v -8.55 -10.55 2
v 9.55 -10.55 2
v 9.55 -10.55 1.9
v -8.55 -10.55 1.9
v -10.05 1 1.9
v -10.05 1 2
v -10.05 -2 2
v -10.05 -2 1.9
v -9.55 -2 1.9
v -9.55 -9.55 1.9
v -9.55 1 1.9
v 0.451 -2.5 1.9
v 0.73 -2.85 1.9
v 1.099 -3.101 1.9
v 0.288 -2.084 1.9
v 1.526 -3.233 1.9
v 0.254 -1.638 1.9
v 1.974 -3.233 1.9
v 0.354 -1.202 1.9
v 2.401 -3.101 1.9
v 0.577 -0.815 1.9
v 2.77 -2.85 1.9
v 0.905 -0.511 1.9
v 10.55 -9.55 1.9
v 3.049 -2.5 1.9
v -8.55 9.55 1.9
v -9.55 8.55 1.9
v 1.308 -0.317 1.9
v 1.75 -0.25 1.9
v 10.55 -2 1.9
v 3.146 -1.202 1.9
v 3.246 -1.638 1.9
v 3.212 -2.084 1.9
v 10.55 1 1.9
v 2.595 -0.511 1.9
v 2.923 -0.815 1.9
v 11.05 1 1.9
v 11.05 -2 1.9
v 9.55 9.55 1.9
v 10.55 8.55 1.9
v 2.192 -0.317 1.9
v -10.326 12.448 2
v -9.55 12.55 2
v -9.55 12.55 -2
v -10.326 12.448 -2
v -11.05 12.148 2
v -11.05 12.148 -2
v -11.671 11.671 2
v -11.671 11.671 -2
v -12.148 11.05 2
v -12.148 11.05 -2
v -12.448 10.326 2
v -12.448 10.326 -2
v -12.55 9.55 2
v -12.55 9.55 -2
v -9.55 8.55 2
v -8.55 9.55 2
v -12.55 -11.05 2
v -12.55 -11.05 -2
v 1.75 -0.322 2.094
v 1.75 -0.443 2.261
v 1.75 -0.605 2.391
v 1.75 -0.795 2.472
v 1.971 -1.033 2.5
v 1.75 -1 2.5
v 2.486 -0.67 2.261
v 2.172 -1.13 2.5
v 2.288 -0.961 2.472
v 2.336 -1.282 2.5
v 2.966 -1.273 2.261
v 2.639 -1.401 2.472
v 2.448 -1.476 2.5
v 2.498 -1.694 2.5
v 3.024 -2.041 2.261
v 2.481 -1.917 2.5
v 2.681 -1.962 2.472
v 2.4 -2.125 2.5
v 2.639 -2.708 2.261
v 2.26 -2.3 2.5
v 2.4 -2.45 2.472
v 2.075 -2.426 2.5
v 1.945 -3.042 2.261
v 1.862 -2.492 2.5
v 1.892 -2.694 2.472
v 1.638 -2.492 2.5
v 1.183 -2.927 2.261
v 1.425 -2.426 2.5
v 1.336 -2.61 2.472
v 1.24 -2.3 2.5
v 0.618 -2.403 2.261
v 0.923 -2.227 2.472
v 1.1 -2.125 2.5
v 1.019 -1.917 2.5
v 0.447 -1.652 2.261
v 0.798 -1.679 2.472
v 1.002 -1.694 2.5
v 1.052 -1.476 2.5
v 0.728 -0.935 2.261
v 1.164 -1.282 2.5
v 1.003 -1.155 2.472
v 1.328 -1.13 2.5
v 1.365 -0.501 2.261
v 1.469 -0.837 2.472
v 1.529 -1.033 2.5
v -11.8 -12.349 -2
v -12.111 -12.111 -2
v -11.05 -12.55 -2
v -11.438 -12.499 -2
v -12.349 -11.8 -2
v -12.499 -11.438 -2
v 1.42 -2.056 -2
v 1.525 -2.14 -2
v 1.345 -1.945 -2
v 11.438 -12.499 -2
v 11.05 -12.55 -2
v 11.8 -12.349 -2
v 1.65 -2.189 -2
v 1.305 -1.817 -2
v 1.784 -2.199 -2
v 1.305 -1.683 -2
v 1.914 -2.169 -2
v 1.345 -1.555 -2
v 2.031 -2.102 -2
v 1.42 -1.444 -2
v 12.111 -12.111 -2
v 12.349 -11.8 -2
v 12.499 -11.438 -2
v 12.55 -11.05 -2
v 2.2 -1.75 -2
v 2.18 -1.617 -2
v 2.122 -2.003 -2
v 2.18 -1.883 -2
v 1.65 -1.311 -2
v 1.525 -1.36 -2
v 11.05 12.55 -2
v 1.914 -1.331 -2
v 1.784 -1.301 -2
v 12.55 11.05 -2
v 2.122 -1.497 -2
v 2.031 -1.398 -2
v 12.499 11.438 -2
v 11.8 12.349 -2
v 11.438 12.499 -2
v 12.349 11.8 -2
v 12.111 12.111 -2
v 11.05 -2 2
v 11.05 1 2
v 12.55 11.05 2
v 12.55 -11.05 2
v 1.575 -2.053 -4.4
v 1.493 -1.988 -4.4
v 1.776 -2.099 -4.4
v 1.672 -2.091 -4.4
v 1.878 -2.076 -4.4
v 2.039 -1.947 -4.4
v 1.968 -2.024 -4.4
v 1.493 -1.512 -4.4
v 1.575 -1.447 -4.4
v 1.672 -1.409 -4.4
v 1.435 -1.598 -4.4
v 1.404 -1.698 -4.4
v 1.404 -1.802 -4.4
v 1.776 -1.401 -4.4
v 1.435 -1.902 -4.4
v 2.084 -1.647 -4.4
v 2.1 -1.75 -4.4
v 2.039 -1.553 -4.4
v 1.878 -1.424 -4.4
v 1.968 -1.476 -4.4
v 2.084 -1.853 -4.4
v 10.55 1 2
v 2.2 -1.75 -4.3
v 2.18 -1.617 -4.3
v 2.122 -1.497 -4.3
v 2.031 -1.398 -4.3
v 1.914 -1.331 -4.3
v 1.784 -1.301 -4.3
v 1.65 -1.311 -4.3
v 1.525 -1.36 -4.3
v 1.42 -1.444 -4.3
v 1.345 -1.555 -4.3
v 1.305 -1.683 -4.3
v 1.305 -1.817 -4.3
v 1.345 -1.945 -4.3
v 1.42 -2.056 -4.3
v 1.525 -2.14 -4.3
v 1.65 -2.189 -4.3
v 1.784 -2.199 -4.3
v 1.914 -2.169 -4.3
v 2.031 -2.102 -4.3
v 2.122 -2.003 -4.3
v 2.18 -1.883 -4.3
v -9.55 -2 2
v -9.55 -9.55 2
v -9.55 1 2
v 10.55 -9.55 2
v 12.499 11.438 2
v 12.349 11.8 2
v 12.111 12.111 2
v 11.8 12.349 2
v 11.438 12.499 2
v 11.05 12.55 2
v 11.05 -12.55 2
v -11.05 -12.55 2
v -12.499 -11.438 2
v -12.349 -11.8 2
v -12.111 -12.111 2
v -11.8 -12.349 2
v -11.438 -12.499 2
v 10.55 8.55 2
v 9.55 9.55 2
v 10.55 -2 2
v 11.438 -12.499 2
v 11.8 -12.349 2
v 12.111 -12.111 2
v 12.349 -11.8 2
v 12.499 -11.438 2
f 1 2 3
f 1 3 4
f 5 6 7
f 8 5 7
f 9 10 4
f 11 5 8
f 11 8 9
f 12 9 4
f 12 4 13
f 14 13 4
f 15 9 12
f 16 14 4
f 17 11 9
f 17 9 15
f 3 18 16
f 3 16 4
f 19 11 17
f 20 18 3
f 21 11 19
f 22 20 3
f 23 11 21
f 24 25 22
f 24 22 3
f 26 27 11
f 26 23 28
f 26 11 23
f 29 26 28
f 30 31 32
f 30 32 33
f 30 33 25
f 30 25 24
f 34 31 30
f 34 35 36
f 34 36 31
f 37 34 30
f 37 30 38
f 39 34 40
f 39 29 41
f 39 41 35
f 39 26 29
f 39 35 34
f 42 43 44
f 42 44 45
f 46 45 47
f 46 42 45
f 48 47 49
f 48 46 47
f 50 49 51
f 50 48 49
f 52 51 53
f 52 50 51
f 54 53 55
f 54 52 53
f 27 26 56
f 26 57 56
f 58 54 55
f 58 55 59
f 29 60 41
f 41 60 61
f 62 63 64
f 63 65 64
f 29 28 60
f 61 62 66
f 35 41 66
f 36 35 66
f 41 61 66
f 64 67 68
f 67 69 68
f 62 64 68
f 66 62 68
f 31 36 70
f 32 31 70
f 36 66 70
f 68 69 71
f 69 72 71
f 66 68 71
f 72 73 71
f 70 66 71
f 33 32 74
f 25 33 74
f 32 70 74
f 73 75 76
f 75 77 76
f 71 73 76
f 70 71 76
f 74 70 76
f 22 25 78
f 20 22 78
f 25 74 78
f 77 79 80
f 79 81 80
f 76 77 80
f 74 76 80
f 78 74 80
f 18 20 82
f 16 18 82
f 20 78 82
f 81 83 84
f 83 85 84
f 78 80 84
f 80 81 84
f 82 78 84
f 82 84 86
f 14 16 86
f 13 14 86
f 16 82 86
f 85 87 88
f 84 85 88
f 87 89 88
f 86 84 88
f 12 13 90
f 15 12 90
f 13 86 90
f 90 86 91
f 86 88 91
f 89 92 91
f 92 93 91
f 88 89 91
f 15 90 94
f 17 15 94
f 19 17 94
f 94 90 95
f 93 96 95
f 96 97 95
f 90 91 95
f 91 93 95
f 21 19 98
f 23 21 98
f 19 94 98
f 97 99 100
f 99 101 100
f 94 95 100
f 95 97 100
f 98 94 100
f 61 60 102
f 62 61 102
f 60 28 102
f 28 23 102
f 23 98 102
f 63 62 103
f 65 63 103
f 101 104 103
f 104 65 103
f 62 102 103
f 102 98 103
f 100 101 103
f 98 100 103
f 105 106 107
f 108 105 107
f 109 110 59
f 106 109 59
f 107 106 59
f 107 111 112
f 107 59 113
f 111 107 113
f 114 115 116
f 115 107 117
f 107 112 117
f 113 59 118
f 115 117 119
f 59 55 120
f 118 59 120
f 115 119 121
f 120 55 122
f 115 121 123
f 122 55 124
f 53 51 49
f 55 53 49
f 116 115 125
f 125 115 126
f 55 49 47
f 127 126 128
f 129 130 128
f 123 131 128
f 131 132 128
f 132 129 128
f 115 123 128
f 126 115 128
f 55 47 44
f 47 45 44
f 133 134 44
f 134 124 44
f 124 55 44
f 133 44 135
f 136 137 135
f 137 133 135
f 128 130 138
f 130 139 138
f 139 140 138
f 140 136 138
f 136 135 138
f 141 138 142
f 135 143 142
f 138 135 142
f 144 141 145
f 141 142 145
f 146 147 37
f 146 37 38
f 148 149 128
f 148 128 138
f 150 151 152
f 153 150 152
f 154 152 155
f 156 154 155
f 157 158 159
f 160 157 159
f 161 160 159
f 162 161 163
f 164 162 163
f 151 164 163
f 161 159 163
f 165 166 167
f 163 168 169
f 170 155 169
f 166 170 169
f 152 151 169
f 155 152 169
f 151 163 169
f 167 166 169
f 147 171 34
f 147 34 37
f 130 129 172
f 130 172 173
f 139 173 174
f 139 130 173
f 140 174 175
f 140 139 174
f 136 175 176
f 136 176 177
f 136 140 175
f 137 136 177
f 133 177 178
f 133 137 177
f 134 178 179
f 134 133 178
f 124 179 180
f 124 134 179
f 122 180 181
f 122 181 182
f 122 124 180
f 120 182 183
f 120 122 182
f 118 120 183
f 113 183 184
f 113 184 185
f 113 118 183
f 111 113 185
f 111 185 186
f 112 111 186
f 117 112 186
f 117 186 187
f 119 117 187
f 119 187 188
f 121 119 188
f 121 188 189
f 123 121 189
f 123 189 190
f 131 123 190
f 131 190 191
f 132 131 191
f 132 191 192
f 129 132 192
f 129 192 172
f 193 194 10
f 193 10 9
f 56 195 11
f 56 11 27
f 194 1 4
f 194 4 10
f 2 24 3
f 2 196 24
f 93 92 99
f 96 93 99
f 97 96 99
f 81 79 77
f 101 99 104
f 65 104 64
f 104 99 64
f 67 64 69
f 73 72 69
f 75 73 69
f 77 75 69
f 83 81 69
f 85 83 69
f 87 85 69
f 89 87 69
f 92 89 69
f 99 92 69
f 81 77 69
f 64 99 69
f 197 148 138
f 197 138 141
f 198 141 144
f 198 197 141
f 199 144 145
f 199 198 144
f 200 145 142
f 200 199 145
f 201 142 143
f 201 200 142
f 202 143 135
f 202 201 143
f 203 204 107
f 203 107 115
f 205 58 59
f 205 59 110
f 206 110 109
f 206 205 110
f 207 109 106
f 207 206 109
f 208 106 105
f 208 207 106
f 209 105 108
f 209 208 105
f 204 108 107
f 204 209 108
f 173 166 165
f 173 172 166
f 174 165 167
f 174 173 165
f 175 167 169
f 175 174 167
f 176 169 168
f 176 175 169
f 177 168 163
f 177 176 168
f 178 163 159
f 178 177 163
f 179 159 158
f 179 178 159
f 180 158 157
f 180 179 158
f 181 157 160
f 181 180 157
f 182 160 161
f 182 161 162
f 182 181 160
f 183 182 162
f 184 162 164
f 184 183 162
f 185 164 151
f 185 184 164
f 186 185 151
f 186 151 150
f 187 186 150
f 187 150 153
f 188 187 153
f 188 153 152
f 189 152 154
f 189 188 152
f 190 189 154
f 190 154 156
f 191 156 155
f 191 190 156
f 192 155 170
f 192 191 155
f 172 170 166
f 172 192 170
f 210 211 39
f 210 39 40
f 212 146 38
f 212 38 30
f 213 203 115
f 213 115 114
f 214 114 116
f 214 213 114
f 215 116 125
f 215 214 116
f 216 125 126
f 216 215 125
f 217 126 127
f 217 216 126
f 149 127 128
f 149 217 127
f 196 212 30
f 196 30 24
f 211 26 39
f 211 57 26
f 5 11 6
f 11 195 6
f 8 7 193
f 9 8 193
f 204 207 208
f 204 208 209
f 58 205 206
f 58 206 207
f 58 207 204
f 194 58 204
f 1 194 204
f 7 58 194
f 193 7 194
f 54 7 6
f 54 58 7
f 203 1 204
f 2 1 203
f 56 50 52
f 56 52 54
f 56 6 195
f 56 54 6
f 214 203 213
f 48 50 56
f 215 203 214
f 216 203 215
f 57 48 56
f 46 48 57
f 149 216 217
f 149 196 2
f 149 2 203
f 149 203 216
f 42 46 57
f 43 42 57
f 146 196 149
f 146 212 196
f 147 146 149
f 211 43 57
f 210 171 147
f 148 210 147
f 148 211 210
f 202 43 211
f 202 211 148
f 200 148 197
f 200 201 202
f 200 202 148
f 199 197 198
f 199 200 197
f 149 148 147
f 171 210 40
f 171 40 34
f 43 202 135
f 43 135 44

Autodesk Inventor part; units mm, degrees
ref_plane "XZ Plane" through (0, 0, 0) normal (0, 1, 0) x (-1, 0, 0)
ref_plane "XY Plane" through (0, 0, 0) normal (0, 0, 1) x (1, 0, 0)
sketch "Sketch1" plane through (0, 0, 0) normal (0, 0, 1) x (1, 0, 0)
  line L0 (-11.05, -12.55) -> (11.05, -12.55)
  line L1 (12.55, -11.05) -> (12.55, 11.05)
  line L2 (11.05, 12.55) -> (-9.55, 12.55)
  line L3 (-12.55, 9.55) -> (-12.55, -11.05)
  line L4 (-12.55, -12.55) -> (12.55, 12.55) construction
  line L5 (12.55, -12.55) -> (-12.55, 12.55) construction
  arc A0 (-9.55, 12.55) -> (-12.55, 9.55) centre (-9.55, 9.55) ccw
  arc A1 (-12.55, -11.05) -> (-11.05, -12.55) centre (-11.05, -11.05) ccw
  arc A2 (11.05, -12.55) -> (12.55, -11.05) centre (11.05, -11.05) ccw
  arc A3 (12.55, 11.05) -> (11.05, 12.55) centre (11.05, 11.05) ccw
  circle A4 centre (1.75, -1.75) radius 0.45
  point P0 (0, 0)
  point P1 (0, 0)
  dimension "d0" = 25.1
  dimension "d1" = 3
  dimension "d2" = 0.9
  dimension "d7" = 1.5
  dimension "d8" = 25.1
  dimension "d9" = 1.75
extrude "Extrusion1" add sketch "Sketch1" along normal mid plane 4 contours A1 L3 A0 L2 A3 L1 A2 L0 | A4
extrude "Extrusion2" add sketch "Sketch1" against normal blind 4.4 and the other way blind 2.25 contours A4
chamfer "Chamfer1" distance 0.1 angle 45 1 edges at (1.3, -1.75, -4.4)
sketch "Sketch4" plane through (0, 0, 2) normal (0, 0, 1) x (1, 0, 0)
  line L0 (-12.55, 9.55) -> (-12.55, -11.05) projected
  arc A0 (-12.55, -11.05) -> (-11.05, -12.55) centre (-11.05, -11.05) ccw projected
  line L1 (-11.05, -12.55) -> (11.05, -12.55) projected
  arc A1 (11.05, -12.55) -> (12.55, -11.05) centre (11.05, -11.05) ccw projected
  line L2 (12.55, -11.05) -> (12.55, 11.05) projected
  arc A2 (12.55, 11.05) -> (11.05, 12.55) centre (11.05, 11.05) ccw projected
  line L3 (11.05, 12.55) -> (-9.55, 12.55) projected
  arc A3 (-9.55, 12.55) -> (-12.55, 9.55) centre (-9.55, 9.55) ccw projected
  line L4 (-8.55, 9.55) -> (9.55, 9.55)
  line L5 (10.55, 8.55) -> (10.55, -9.55)
  line L6 (9.55, -10.55) -> (-8.55, -10.55)
  line L7 (-9.55, -9.55) -> (-9.55, 8.55)
  line L8 (-8.55, 9.55) -> (-9.55, 8.55)
  line L9 (9.55, 9.55) -> (10.55, 8.55)
  line L10 (10.55, -9.55) -> (9.55, -10.55)
  line L11 (-8.55, -10.55) -> (-9.55, -9.55)
  line L12 (-9.55, 1) -> (-10.05, 1)
  line L13 (-10.05, 1) -> (-10.05, -2)
  line L14 (-10.05, -2) -> (-9.55, -2)
  line L15 (-9.55, -2) -> (-9.55, 1)
  line L16 (10.55, 1) -> (11.05, 1)
  line L17 (11.05, 1) -> (11.05, -2)
  line L18 (11.05, -2) -> (10.55, -2)
  line L19 (10.55, -2) -> (10.55, 1)
  point P0 (0, 0)
  point P1 (10.55, -10.55)
  point P2 (10.55, 9.55)
  point P3 (-9.55, -10.55)
  point P4 (10.55, -0.5)
  point P5 (-9.55, -0.5)
  dimension "d21" = 1
  dimension "d22" = 1
  dimension "d23" = 1
  dimension "d24" = 1
  dimension "d25" = 1
  dimension "d26" = 1
  dimension "d27" = 1
  dimension "d28" = 1
  dimension "d29" = 2
  dimension "d30" = 2
  dimension "d31" = 3
  dimension "d32" = 3
  dimension "d33" = 0.5
  dimension "d34" = 3
extrude "Extrusion3" cut sketch "Sketch4" against normal blind 0.1 contours L4 L9 L5 L10 L6 L11 L7 L8 | L7 L14 L13 L12 | L16 L17 L18 L5
ref_plane "Work Plane1" through (1.75, -1.75, 0) normal (1, 0, 0) x (0, 1, 0)
sketch "Sketch5" plane through (1.75, -1.75, 0) normal (1, 0, 0) x (0, 1, 0)
  line L0 (10.3, 1.9) -> (2.75, 1.9) projected
  line L1 (11.3, 1.9) -> (10.3, 1.9) projected
  line L2 (10.3, 1.9) -> (11.3, 1.9) projected
  line L3 (2.75, 1.9) -> (10.3, 1.9) projected
  line L4 (-0.25, 1.9) -> (2.75, 1.9) projected
  line L5 (-7.8, 1.9) -> (-0.25, 1.9) projected
  line L6 (-8.8, 1.9) -> (-7.8, 1.9) projected
  line L7 (-7.8, 1.9) -> (-8.8, 1.9) projected
  line L8 (-0.25, 1.9) -> (-7.8, 1.9) projected
  line L9 (2.75, 1.9) -> (-0.25, 1.9) projected
  arc A0 (-0.75, 2.5) -> (-1.5, 1.9) centre (-0.75, 1.7312) ccw
  arc A1 (1.5, 1.9) -> (0.75, 2.5) centre (0.75, 1.7312) ccw
  line L10 (-0.75, 2.5) -> (0.75, 2.5)
  line L11 (0.45, -2) -> (-0.45, -2) projected
  line L12 (-0.45, -4.3) -> (0.45, -4.3) projected
  line L13 (0, 2.5) -> (0, 1.9)
  point P0 (1.75, 0)
  point P1 (0, -2)
  dimension "d37" = 1.5
  dimension "d38" = 3
  dimension "d39" = 0.6
revolve "Revolution2" add sketch "Sketch5" angle 360 about axis through (1.75, -1.75, 2.5) along (0, 0, -1) contours L13 L10 A1 L4
sketch "Sketch6" plane through (0, 0, 1.9) normal (0, 0, 1) x (1, 0, 0)
  circle A0 centre (1.75, -1.75) radius 1.5 projected
  line L0 (10.55, 1) -> (11.05, 1) projected
  line L1 (10.55, 8.55) -> (10.55, 1) projected
  line L2 (9.55, 9.55) -> (10.55, 8.55) projected
  line L3 (-8.55, 9.55) -> (9.55, 9.55) projected
  line L4 (-9.55, 8.55) -> (-8.55, 9.55) projected
  line L5 (-9.55, 1) -> (-9.55, 8.55) projected
  line L6 (-10.05, 1) -> (-9.55, 1) projected
  line L7 (-10.05, -2) -> (-10.05, 1) projected
  line L8 (-9.55, -2) -> (-10.05, -2) projected
  line L9 (-9.55, -9.55) -> (-9.55, -2) projected
  line L10 (-8.55, -10.55) -> (-9.55, -9.55) projected
  line L11 (9.55, -10.55) -> (-8.55, -10.55) projected
  line L12 (10.55, -9.55) -> (9.55, -10.55) projected
  line L13 (10.55, -2) -> (10.55, -9.55) projected
  line L14 (11.05, -2) -> (10.55, -2) projected
  line L15 (11.05, 1) -> (11.05, -2) projected
  circle A1 centre (1.75, -1.75) radius 2
  point P0 (0, 0)
  dimension "d41" = 4
split_face "Split1"
equation "\"d8\" = d0"
equation "\"d22\" = d21"
equation "\"d23\" = d21"
equation "\"d24\" = d23"
equation "\"d25\" = d21"
equation "\"d26\" = d25"
equation "\"d27\" = d21"
equation "\"d28\" = d27"
equation "\"d30\" = d29"
properties part number "Antenna_GPSPatch" material "Porcelain, Linen"
